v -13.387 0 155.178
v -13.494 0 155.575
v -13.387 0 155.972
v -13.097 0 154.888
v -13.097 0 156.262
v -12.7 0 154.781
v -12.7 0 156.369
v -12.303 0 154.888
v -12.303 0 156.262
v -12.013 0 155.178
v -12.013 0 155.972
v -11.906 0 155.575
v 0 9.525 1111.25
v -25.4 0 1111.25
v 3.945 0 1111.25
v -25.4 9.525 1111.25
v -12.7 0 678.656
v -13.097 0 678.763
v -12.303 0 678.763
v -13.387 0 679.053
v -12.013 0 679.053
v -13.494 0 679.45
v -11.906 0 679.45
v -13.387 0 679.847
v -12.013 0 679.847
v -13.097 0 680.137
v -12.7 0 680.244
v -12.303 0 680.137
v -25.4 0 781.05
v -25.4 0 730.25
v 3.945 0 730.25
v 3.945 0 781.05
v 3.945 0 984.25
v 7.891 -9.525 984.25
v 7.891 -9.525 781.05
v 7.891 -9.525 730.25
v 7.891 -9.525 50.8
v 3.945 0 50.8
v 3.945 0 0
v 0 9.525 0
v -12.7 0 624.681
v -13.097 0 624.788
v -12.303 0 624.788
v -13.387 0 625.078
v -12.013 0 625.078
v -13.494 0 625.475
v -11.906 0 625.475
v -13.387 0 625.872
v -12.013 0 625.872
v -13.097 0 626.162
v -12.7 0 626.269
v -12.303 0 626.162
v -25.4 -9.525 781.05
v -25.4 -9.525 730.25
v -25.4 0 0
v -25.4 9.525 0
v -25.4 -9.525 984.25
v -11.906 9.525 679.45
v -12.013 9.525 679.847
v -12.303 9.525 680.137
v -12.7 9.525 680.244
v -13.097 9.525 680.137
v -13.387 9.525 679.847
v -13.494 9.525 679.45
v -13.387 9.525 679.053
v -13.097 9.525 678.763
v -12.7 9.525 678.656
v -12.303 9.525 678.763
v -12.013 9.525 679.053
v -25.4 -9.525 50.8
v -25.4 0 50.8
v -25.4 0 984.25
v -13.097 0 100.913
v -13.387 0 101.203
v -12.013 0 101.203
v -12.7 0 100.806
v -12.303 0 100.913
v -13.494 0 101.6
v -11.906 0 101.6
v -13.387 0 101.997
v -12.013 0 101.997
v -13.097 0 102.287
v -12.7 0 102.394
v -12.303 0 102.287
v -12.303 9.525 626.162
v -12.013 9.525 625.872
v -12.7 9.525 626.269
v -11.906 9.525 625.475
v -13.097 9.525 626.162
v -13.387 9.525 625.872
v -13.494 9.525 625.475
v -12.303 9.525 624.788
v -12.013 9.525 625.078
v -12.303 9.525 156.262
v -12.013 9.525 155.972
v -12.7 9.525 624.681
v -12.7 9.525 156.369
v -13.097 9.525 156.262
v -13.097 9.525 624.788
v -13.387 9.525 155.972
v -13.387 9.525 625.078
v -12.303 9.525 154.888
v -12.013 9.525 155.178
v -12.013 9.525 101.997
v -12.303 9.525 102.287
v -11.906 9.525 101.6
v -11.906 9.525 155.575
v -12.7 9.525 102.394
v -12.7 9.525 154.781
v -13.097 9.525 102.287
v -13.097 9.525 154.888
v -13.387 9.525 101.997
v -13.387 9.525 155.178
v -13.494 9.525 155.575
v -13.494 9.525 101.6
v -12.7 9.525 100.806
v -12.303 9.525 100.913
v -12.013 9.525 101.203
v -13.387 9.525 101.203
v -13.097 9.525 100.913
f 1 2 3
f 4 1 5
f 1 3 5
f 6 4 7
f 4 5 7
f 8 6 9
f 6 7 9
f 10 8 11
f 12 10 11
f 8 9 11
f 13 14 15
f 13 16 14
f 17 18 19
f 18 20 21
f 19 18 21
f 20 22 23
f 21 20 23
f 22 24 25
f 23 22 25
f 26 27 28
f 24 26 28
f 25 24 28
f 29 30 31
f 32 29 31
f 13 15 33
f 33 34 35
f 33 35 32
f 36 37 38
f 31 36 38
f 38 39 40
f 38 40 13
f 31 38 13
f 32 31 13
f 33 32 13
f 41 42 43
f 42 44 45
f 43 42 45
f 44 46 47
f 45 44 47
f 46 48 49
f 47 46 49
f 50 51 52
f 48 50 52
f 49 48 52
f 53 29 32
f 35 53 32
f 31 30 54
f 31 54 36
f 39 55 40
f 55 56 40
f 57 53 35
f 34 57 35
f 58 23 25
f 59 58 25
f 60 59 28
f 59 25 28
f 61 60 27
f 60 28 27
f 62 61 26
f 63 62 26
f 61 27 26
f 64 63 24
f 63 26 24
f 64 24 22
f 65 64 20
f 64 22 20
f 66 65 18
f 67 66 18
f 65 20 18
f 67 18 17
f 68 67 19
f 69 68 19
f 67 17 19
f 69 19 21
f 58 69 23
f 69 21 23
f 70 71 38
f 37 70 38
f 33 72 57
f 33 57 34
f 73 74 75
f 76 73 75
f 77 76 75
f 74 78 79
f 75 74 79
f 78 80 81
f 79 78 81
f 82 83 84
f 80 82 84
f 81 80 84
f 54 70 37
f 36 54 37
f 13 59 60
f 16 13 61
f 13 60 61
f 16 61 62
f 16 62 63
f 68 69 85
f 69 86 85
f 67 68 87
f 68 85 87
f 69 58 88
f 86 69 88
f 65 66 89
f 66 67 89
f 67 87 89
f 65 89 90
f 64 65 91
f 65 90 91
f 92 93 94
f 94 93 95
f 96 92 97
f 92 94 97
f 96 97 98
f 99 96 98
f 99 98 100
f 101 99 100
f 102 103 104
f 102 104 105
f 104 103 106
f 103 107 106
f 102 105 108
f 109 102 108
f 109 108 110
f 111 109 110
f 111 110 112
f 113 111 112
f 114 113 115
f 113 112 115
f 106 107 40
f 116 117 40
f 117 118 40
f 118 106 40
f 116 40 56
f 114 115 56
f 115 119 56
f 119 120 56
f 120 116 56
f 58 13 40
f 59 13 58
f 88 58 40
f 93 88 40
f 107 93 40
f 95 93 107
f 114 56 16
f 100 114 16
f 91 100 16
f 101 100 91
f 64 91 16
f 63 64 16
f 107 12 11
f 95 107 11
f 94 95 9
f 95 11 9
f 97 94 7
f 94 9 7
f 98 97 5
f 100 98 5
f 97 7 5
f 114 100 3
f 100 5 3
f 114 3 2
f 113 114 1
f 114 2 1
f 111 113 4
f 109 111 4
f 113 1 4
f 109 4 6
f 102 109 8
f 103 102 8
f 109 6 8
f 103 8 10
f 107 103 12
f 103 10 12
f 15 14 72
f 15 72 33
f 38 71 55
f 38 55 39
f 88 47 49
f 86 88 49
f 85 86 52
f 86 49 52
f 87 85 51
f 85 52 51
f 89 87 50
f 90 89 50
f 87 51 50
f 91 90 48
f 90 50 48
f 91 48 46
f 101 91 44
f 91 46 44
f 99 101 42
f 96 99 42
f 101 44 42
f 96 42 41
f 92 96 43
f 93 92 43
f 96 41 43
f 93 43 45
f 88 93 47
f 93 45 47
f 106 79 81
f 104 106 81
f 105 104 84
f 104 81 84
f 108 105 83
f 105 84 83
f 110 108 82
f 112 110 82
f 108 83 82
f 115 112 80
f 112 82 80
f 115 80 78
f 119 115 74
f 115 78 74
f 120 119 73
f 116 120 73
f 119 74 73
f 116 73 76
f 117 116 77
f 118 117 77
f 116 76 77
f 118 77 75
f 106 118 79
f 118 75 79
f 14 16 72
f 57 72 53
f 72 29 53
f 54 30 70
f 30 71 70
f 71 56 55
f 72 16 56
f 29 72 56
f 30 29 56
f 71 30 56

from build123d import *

# Parameters (mm, degrees)
F1_DEPTH = 1111.25
F2_W     = 122.435573
F2_H     = 50.8
F2_W_2   = 93.867282
F2_W_3   = 343.160421
F2_H_2   = 127
F3_DEPTH = 25.4
F4_R     = 0.79375
F5_DEPTH = 25.4


with BuildPart() as f1:
    # F0 (on Top) → F1 (new body)
    with BuildSketch(Plane.XY):
        Polygon((7.890768, -9.525), (0, 9.525), (-25.4, 9.525), (-25.4, -9.525), align=None)
    extrude(amount=F1_DEPTH)

    # F2 (on Front) → F3 (cut)
    with BuildSketch(Plane.XZ):
        with Locations((22.446524, 25.4)):
            Rectangle(F2_W, F2_H)
        with Locations((2.720783, 755.65)):
            Rectangle(F2_W_2, F2_H)
        with Locations((-38.781822, 1047.75)):
            Rectangle(F2_W_3, F2_H_2)
    extrude(amount=F3_DEPTH, mode=Mode.SUBTRACT)

    # F4 (on Front) → F5 (cut)
    with BuildSketch(Plane.XZ):
        with Locations((12.7, 101.6)):
            Circle(F4_R)
        with Locations((12.7, 155.575)):
            Circle(F4_R)
        with Locations((12.7, 625.475)):
            Circle(F4_R)
        with Locations((12.7, 679.45)):
            Circle(F4_R)
        with Locations((-12.7, 625.475)):
            Circle(F4_R)
        with Locations((-12.7, 679.45)):
            Circle(F4_R)
        with Locations((-12.7, 101.6)):
            Circle(F4_R)
        with Locations((-12.7, 155.575)):
            Circle(F4_R)
    extrude(amount=-F5_DEPTH, mode=Mode.SUBTRACT)


solid = f1.part
